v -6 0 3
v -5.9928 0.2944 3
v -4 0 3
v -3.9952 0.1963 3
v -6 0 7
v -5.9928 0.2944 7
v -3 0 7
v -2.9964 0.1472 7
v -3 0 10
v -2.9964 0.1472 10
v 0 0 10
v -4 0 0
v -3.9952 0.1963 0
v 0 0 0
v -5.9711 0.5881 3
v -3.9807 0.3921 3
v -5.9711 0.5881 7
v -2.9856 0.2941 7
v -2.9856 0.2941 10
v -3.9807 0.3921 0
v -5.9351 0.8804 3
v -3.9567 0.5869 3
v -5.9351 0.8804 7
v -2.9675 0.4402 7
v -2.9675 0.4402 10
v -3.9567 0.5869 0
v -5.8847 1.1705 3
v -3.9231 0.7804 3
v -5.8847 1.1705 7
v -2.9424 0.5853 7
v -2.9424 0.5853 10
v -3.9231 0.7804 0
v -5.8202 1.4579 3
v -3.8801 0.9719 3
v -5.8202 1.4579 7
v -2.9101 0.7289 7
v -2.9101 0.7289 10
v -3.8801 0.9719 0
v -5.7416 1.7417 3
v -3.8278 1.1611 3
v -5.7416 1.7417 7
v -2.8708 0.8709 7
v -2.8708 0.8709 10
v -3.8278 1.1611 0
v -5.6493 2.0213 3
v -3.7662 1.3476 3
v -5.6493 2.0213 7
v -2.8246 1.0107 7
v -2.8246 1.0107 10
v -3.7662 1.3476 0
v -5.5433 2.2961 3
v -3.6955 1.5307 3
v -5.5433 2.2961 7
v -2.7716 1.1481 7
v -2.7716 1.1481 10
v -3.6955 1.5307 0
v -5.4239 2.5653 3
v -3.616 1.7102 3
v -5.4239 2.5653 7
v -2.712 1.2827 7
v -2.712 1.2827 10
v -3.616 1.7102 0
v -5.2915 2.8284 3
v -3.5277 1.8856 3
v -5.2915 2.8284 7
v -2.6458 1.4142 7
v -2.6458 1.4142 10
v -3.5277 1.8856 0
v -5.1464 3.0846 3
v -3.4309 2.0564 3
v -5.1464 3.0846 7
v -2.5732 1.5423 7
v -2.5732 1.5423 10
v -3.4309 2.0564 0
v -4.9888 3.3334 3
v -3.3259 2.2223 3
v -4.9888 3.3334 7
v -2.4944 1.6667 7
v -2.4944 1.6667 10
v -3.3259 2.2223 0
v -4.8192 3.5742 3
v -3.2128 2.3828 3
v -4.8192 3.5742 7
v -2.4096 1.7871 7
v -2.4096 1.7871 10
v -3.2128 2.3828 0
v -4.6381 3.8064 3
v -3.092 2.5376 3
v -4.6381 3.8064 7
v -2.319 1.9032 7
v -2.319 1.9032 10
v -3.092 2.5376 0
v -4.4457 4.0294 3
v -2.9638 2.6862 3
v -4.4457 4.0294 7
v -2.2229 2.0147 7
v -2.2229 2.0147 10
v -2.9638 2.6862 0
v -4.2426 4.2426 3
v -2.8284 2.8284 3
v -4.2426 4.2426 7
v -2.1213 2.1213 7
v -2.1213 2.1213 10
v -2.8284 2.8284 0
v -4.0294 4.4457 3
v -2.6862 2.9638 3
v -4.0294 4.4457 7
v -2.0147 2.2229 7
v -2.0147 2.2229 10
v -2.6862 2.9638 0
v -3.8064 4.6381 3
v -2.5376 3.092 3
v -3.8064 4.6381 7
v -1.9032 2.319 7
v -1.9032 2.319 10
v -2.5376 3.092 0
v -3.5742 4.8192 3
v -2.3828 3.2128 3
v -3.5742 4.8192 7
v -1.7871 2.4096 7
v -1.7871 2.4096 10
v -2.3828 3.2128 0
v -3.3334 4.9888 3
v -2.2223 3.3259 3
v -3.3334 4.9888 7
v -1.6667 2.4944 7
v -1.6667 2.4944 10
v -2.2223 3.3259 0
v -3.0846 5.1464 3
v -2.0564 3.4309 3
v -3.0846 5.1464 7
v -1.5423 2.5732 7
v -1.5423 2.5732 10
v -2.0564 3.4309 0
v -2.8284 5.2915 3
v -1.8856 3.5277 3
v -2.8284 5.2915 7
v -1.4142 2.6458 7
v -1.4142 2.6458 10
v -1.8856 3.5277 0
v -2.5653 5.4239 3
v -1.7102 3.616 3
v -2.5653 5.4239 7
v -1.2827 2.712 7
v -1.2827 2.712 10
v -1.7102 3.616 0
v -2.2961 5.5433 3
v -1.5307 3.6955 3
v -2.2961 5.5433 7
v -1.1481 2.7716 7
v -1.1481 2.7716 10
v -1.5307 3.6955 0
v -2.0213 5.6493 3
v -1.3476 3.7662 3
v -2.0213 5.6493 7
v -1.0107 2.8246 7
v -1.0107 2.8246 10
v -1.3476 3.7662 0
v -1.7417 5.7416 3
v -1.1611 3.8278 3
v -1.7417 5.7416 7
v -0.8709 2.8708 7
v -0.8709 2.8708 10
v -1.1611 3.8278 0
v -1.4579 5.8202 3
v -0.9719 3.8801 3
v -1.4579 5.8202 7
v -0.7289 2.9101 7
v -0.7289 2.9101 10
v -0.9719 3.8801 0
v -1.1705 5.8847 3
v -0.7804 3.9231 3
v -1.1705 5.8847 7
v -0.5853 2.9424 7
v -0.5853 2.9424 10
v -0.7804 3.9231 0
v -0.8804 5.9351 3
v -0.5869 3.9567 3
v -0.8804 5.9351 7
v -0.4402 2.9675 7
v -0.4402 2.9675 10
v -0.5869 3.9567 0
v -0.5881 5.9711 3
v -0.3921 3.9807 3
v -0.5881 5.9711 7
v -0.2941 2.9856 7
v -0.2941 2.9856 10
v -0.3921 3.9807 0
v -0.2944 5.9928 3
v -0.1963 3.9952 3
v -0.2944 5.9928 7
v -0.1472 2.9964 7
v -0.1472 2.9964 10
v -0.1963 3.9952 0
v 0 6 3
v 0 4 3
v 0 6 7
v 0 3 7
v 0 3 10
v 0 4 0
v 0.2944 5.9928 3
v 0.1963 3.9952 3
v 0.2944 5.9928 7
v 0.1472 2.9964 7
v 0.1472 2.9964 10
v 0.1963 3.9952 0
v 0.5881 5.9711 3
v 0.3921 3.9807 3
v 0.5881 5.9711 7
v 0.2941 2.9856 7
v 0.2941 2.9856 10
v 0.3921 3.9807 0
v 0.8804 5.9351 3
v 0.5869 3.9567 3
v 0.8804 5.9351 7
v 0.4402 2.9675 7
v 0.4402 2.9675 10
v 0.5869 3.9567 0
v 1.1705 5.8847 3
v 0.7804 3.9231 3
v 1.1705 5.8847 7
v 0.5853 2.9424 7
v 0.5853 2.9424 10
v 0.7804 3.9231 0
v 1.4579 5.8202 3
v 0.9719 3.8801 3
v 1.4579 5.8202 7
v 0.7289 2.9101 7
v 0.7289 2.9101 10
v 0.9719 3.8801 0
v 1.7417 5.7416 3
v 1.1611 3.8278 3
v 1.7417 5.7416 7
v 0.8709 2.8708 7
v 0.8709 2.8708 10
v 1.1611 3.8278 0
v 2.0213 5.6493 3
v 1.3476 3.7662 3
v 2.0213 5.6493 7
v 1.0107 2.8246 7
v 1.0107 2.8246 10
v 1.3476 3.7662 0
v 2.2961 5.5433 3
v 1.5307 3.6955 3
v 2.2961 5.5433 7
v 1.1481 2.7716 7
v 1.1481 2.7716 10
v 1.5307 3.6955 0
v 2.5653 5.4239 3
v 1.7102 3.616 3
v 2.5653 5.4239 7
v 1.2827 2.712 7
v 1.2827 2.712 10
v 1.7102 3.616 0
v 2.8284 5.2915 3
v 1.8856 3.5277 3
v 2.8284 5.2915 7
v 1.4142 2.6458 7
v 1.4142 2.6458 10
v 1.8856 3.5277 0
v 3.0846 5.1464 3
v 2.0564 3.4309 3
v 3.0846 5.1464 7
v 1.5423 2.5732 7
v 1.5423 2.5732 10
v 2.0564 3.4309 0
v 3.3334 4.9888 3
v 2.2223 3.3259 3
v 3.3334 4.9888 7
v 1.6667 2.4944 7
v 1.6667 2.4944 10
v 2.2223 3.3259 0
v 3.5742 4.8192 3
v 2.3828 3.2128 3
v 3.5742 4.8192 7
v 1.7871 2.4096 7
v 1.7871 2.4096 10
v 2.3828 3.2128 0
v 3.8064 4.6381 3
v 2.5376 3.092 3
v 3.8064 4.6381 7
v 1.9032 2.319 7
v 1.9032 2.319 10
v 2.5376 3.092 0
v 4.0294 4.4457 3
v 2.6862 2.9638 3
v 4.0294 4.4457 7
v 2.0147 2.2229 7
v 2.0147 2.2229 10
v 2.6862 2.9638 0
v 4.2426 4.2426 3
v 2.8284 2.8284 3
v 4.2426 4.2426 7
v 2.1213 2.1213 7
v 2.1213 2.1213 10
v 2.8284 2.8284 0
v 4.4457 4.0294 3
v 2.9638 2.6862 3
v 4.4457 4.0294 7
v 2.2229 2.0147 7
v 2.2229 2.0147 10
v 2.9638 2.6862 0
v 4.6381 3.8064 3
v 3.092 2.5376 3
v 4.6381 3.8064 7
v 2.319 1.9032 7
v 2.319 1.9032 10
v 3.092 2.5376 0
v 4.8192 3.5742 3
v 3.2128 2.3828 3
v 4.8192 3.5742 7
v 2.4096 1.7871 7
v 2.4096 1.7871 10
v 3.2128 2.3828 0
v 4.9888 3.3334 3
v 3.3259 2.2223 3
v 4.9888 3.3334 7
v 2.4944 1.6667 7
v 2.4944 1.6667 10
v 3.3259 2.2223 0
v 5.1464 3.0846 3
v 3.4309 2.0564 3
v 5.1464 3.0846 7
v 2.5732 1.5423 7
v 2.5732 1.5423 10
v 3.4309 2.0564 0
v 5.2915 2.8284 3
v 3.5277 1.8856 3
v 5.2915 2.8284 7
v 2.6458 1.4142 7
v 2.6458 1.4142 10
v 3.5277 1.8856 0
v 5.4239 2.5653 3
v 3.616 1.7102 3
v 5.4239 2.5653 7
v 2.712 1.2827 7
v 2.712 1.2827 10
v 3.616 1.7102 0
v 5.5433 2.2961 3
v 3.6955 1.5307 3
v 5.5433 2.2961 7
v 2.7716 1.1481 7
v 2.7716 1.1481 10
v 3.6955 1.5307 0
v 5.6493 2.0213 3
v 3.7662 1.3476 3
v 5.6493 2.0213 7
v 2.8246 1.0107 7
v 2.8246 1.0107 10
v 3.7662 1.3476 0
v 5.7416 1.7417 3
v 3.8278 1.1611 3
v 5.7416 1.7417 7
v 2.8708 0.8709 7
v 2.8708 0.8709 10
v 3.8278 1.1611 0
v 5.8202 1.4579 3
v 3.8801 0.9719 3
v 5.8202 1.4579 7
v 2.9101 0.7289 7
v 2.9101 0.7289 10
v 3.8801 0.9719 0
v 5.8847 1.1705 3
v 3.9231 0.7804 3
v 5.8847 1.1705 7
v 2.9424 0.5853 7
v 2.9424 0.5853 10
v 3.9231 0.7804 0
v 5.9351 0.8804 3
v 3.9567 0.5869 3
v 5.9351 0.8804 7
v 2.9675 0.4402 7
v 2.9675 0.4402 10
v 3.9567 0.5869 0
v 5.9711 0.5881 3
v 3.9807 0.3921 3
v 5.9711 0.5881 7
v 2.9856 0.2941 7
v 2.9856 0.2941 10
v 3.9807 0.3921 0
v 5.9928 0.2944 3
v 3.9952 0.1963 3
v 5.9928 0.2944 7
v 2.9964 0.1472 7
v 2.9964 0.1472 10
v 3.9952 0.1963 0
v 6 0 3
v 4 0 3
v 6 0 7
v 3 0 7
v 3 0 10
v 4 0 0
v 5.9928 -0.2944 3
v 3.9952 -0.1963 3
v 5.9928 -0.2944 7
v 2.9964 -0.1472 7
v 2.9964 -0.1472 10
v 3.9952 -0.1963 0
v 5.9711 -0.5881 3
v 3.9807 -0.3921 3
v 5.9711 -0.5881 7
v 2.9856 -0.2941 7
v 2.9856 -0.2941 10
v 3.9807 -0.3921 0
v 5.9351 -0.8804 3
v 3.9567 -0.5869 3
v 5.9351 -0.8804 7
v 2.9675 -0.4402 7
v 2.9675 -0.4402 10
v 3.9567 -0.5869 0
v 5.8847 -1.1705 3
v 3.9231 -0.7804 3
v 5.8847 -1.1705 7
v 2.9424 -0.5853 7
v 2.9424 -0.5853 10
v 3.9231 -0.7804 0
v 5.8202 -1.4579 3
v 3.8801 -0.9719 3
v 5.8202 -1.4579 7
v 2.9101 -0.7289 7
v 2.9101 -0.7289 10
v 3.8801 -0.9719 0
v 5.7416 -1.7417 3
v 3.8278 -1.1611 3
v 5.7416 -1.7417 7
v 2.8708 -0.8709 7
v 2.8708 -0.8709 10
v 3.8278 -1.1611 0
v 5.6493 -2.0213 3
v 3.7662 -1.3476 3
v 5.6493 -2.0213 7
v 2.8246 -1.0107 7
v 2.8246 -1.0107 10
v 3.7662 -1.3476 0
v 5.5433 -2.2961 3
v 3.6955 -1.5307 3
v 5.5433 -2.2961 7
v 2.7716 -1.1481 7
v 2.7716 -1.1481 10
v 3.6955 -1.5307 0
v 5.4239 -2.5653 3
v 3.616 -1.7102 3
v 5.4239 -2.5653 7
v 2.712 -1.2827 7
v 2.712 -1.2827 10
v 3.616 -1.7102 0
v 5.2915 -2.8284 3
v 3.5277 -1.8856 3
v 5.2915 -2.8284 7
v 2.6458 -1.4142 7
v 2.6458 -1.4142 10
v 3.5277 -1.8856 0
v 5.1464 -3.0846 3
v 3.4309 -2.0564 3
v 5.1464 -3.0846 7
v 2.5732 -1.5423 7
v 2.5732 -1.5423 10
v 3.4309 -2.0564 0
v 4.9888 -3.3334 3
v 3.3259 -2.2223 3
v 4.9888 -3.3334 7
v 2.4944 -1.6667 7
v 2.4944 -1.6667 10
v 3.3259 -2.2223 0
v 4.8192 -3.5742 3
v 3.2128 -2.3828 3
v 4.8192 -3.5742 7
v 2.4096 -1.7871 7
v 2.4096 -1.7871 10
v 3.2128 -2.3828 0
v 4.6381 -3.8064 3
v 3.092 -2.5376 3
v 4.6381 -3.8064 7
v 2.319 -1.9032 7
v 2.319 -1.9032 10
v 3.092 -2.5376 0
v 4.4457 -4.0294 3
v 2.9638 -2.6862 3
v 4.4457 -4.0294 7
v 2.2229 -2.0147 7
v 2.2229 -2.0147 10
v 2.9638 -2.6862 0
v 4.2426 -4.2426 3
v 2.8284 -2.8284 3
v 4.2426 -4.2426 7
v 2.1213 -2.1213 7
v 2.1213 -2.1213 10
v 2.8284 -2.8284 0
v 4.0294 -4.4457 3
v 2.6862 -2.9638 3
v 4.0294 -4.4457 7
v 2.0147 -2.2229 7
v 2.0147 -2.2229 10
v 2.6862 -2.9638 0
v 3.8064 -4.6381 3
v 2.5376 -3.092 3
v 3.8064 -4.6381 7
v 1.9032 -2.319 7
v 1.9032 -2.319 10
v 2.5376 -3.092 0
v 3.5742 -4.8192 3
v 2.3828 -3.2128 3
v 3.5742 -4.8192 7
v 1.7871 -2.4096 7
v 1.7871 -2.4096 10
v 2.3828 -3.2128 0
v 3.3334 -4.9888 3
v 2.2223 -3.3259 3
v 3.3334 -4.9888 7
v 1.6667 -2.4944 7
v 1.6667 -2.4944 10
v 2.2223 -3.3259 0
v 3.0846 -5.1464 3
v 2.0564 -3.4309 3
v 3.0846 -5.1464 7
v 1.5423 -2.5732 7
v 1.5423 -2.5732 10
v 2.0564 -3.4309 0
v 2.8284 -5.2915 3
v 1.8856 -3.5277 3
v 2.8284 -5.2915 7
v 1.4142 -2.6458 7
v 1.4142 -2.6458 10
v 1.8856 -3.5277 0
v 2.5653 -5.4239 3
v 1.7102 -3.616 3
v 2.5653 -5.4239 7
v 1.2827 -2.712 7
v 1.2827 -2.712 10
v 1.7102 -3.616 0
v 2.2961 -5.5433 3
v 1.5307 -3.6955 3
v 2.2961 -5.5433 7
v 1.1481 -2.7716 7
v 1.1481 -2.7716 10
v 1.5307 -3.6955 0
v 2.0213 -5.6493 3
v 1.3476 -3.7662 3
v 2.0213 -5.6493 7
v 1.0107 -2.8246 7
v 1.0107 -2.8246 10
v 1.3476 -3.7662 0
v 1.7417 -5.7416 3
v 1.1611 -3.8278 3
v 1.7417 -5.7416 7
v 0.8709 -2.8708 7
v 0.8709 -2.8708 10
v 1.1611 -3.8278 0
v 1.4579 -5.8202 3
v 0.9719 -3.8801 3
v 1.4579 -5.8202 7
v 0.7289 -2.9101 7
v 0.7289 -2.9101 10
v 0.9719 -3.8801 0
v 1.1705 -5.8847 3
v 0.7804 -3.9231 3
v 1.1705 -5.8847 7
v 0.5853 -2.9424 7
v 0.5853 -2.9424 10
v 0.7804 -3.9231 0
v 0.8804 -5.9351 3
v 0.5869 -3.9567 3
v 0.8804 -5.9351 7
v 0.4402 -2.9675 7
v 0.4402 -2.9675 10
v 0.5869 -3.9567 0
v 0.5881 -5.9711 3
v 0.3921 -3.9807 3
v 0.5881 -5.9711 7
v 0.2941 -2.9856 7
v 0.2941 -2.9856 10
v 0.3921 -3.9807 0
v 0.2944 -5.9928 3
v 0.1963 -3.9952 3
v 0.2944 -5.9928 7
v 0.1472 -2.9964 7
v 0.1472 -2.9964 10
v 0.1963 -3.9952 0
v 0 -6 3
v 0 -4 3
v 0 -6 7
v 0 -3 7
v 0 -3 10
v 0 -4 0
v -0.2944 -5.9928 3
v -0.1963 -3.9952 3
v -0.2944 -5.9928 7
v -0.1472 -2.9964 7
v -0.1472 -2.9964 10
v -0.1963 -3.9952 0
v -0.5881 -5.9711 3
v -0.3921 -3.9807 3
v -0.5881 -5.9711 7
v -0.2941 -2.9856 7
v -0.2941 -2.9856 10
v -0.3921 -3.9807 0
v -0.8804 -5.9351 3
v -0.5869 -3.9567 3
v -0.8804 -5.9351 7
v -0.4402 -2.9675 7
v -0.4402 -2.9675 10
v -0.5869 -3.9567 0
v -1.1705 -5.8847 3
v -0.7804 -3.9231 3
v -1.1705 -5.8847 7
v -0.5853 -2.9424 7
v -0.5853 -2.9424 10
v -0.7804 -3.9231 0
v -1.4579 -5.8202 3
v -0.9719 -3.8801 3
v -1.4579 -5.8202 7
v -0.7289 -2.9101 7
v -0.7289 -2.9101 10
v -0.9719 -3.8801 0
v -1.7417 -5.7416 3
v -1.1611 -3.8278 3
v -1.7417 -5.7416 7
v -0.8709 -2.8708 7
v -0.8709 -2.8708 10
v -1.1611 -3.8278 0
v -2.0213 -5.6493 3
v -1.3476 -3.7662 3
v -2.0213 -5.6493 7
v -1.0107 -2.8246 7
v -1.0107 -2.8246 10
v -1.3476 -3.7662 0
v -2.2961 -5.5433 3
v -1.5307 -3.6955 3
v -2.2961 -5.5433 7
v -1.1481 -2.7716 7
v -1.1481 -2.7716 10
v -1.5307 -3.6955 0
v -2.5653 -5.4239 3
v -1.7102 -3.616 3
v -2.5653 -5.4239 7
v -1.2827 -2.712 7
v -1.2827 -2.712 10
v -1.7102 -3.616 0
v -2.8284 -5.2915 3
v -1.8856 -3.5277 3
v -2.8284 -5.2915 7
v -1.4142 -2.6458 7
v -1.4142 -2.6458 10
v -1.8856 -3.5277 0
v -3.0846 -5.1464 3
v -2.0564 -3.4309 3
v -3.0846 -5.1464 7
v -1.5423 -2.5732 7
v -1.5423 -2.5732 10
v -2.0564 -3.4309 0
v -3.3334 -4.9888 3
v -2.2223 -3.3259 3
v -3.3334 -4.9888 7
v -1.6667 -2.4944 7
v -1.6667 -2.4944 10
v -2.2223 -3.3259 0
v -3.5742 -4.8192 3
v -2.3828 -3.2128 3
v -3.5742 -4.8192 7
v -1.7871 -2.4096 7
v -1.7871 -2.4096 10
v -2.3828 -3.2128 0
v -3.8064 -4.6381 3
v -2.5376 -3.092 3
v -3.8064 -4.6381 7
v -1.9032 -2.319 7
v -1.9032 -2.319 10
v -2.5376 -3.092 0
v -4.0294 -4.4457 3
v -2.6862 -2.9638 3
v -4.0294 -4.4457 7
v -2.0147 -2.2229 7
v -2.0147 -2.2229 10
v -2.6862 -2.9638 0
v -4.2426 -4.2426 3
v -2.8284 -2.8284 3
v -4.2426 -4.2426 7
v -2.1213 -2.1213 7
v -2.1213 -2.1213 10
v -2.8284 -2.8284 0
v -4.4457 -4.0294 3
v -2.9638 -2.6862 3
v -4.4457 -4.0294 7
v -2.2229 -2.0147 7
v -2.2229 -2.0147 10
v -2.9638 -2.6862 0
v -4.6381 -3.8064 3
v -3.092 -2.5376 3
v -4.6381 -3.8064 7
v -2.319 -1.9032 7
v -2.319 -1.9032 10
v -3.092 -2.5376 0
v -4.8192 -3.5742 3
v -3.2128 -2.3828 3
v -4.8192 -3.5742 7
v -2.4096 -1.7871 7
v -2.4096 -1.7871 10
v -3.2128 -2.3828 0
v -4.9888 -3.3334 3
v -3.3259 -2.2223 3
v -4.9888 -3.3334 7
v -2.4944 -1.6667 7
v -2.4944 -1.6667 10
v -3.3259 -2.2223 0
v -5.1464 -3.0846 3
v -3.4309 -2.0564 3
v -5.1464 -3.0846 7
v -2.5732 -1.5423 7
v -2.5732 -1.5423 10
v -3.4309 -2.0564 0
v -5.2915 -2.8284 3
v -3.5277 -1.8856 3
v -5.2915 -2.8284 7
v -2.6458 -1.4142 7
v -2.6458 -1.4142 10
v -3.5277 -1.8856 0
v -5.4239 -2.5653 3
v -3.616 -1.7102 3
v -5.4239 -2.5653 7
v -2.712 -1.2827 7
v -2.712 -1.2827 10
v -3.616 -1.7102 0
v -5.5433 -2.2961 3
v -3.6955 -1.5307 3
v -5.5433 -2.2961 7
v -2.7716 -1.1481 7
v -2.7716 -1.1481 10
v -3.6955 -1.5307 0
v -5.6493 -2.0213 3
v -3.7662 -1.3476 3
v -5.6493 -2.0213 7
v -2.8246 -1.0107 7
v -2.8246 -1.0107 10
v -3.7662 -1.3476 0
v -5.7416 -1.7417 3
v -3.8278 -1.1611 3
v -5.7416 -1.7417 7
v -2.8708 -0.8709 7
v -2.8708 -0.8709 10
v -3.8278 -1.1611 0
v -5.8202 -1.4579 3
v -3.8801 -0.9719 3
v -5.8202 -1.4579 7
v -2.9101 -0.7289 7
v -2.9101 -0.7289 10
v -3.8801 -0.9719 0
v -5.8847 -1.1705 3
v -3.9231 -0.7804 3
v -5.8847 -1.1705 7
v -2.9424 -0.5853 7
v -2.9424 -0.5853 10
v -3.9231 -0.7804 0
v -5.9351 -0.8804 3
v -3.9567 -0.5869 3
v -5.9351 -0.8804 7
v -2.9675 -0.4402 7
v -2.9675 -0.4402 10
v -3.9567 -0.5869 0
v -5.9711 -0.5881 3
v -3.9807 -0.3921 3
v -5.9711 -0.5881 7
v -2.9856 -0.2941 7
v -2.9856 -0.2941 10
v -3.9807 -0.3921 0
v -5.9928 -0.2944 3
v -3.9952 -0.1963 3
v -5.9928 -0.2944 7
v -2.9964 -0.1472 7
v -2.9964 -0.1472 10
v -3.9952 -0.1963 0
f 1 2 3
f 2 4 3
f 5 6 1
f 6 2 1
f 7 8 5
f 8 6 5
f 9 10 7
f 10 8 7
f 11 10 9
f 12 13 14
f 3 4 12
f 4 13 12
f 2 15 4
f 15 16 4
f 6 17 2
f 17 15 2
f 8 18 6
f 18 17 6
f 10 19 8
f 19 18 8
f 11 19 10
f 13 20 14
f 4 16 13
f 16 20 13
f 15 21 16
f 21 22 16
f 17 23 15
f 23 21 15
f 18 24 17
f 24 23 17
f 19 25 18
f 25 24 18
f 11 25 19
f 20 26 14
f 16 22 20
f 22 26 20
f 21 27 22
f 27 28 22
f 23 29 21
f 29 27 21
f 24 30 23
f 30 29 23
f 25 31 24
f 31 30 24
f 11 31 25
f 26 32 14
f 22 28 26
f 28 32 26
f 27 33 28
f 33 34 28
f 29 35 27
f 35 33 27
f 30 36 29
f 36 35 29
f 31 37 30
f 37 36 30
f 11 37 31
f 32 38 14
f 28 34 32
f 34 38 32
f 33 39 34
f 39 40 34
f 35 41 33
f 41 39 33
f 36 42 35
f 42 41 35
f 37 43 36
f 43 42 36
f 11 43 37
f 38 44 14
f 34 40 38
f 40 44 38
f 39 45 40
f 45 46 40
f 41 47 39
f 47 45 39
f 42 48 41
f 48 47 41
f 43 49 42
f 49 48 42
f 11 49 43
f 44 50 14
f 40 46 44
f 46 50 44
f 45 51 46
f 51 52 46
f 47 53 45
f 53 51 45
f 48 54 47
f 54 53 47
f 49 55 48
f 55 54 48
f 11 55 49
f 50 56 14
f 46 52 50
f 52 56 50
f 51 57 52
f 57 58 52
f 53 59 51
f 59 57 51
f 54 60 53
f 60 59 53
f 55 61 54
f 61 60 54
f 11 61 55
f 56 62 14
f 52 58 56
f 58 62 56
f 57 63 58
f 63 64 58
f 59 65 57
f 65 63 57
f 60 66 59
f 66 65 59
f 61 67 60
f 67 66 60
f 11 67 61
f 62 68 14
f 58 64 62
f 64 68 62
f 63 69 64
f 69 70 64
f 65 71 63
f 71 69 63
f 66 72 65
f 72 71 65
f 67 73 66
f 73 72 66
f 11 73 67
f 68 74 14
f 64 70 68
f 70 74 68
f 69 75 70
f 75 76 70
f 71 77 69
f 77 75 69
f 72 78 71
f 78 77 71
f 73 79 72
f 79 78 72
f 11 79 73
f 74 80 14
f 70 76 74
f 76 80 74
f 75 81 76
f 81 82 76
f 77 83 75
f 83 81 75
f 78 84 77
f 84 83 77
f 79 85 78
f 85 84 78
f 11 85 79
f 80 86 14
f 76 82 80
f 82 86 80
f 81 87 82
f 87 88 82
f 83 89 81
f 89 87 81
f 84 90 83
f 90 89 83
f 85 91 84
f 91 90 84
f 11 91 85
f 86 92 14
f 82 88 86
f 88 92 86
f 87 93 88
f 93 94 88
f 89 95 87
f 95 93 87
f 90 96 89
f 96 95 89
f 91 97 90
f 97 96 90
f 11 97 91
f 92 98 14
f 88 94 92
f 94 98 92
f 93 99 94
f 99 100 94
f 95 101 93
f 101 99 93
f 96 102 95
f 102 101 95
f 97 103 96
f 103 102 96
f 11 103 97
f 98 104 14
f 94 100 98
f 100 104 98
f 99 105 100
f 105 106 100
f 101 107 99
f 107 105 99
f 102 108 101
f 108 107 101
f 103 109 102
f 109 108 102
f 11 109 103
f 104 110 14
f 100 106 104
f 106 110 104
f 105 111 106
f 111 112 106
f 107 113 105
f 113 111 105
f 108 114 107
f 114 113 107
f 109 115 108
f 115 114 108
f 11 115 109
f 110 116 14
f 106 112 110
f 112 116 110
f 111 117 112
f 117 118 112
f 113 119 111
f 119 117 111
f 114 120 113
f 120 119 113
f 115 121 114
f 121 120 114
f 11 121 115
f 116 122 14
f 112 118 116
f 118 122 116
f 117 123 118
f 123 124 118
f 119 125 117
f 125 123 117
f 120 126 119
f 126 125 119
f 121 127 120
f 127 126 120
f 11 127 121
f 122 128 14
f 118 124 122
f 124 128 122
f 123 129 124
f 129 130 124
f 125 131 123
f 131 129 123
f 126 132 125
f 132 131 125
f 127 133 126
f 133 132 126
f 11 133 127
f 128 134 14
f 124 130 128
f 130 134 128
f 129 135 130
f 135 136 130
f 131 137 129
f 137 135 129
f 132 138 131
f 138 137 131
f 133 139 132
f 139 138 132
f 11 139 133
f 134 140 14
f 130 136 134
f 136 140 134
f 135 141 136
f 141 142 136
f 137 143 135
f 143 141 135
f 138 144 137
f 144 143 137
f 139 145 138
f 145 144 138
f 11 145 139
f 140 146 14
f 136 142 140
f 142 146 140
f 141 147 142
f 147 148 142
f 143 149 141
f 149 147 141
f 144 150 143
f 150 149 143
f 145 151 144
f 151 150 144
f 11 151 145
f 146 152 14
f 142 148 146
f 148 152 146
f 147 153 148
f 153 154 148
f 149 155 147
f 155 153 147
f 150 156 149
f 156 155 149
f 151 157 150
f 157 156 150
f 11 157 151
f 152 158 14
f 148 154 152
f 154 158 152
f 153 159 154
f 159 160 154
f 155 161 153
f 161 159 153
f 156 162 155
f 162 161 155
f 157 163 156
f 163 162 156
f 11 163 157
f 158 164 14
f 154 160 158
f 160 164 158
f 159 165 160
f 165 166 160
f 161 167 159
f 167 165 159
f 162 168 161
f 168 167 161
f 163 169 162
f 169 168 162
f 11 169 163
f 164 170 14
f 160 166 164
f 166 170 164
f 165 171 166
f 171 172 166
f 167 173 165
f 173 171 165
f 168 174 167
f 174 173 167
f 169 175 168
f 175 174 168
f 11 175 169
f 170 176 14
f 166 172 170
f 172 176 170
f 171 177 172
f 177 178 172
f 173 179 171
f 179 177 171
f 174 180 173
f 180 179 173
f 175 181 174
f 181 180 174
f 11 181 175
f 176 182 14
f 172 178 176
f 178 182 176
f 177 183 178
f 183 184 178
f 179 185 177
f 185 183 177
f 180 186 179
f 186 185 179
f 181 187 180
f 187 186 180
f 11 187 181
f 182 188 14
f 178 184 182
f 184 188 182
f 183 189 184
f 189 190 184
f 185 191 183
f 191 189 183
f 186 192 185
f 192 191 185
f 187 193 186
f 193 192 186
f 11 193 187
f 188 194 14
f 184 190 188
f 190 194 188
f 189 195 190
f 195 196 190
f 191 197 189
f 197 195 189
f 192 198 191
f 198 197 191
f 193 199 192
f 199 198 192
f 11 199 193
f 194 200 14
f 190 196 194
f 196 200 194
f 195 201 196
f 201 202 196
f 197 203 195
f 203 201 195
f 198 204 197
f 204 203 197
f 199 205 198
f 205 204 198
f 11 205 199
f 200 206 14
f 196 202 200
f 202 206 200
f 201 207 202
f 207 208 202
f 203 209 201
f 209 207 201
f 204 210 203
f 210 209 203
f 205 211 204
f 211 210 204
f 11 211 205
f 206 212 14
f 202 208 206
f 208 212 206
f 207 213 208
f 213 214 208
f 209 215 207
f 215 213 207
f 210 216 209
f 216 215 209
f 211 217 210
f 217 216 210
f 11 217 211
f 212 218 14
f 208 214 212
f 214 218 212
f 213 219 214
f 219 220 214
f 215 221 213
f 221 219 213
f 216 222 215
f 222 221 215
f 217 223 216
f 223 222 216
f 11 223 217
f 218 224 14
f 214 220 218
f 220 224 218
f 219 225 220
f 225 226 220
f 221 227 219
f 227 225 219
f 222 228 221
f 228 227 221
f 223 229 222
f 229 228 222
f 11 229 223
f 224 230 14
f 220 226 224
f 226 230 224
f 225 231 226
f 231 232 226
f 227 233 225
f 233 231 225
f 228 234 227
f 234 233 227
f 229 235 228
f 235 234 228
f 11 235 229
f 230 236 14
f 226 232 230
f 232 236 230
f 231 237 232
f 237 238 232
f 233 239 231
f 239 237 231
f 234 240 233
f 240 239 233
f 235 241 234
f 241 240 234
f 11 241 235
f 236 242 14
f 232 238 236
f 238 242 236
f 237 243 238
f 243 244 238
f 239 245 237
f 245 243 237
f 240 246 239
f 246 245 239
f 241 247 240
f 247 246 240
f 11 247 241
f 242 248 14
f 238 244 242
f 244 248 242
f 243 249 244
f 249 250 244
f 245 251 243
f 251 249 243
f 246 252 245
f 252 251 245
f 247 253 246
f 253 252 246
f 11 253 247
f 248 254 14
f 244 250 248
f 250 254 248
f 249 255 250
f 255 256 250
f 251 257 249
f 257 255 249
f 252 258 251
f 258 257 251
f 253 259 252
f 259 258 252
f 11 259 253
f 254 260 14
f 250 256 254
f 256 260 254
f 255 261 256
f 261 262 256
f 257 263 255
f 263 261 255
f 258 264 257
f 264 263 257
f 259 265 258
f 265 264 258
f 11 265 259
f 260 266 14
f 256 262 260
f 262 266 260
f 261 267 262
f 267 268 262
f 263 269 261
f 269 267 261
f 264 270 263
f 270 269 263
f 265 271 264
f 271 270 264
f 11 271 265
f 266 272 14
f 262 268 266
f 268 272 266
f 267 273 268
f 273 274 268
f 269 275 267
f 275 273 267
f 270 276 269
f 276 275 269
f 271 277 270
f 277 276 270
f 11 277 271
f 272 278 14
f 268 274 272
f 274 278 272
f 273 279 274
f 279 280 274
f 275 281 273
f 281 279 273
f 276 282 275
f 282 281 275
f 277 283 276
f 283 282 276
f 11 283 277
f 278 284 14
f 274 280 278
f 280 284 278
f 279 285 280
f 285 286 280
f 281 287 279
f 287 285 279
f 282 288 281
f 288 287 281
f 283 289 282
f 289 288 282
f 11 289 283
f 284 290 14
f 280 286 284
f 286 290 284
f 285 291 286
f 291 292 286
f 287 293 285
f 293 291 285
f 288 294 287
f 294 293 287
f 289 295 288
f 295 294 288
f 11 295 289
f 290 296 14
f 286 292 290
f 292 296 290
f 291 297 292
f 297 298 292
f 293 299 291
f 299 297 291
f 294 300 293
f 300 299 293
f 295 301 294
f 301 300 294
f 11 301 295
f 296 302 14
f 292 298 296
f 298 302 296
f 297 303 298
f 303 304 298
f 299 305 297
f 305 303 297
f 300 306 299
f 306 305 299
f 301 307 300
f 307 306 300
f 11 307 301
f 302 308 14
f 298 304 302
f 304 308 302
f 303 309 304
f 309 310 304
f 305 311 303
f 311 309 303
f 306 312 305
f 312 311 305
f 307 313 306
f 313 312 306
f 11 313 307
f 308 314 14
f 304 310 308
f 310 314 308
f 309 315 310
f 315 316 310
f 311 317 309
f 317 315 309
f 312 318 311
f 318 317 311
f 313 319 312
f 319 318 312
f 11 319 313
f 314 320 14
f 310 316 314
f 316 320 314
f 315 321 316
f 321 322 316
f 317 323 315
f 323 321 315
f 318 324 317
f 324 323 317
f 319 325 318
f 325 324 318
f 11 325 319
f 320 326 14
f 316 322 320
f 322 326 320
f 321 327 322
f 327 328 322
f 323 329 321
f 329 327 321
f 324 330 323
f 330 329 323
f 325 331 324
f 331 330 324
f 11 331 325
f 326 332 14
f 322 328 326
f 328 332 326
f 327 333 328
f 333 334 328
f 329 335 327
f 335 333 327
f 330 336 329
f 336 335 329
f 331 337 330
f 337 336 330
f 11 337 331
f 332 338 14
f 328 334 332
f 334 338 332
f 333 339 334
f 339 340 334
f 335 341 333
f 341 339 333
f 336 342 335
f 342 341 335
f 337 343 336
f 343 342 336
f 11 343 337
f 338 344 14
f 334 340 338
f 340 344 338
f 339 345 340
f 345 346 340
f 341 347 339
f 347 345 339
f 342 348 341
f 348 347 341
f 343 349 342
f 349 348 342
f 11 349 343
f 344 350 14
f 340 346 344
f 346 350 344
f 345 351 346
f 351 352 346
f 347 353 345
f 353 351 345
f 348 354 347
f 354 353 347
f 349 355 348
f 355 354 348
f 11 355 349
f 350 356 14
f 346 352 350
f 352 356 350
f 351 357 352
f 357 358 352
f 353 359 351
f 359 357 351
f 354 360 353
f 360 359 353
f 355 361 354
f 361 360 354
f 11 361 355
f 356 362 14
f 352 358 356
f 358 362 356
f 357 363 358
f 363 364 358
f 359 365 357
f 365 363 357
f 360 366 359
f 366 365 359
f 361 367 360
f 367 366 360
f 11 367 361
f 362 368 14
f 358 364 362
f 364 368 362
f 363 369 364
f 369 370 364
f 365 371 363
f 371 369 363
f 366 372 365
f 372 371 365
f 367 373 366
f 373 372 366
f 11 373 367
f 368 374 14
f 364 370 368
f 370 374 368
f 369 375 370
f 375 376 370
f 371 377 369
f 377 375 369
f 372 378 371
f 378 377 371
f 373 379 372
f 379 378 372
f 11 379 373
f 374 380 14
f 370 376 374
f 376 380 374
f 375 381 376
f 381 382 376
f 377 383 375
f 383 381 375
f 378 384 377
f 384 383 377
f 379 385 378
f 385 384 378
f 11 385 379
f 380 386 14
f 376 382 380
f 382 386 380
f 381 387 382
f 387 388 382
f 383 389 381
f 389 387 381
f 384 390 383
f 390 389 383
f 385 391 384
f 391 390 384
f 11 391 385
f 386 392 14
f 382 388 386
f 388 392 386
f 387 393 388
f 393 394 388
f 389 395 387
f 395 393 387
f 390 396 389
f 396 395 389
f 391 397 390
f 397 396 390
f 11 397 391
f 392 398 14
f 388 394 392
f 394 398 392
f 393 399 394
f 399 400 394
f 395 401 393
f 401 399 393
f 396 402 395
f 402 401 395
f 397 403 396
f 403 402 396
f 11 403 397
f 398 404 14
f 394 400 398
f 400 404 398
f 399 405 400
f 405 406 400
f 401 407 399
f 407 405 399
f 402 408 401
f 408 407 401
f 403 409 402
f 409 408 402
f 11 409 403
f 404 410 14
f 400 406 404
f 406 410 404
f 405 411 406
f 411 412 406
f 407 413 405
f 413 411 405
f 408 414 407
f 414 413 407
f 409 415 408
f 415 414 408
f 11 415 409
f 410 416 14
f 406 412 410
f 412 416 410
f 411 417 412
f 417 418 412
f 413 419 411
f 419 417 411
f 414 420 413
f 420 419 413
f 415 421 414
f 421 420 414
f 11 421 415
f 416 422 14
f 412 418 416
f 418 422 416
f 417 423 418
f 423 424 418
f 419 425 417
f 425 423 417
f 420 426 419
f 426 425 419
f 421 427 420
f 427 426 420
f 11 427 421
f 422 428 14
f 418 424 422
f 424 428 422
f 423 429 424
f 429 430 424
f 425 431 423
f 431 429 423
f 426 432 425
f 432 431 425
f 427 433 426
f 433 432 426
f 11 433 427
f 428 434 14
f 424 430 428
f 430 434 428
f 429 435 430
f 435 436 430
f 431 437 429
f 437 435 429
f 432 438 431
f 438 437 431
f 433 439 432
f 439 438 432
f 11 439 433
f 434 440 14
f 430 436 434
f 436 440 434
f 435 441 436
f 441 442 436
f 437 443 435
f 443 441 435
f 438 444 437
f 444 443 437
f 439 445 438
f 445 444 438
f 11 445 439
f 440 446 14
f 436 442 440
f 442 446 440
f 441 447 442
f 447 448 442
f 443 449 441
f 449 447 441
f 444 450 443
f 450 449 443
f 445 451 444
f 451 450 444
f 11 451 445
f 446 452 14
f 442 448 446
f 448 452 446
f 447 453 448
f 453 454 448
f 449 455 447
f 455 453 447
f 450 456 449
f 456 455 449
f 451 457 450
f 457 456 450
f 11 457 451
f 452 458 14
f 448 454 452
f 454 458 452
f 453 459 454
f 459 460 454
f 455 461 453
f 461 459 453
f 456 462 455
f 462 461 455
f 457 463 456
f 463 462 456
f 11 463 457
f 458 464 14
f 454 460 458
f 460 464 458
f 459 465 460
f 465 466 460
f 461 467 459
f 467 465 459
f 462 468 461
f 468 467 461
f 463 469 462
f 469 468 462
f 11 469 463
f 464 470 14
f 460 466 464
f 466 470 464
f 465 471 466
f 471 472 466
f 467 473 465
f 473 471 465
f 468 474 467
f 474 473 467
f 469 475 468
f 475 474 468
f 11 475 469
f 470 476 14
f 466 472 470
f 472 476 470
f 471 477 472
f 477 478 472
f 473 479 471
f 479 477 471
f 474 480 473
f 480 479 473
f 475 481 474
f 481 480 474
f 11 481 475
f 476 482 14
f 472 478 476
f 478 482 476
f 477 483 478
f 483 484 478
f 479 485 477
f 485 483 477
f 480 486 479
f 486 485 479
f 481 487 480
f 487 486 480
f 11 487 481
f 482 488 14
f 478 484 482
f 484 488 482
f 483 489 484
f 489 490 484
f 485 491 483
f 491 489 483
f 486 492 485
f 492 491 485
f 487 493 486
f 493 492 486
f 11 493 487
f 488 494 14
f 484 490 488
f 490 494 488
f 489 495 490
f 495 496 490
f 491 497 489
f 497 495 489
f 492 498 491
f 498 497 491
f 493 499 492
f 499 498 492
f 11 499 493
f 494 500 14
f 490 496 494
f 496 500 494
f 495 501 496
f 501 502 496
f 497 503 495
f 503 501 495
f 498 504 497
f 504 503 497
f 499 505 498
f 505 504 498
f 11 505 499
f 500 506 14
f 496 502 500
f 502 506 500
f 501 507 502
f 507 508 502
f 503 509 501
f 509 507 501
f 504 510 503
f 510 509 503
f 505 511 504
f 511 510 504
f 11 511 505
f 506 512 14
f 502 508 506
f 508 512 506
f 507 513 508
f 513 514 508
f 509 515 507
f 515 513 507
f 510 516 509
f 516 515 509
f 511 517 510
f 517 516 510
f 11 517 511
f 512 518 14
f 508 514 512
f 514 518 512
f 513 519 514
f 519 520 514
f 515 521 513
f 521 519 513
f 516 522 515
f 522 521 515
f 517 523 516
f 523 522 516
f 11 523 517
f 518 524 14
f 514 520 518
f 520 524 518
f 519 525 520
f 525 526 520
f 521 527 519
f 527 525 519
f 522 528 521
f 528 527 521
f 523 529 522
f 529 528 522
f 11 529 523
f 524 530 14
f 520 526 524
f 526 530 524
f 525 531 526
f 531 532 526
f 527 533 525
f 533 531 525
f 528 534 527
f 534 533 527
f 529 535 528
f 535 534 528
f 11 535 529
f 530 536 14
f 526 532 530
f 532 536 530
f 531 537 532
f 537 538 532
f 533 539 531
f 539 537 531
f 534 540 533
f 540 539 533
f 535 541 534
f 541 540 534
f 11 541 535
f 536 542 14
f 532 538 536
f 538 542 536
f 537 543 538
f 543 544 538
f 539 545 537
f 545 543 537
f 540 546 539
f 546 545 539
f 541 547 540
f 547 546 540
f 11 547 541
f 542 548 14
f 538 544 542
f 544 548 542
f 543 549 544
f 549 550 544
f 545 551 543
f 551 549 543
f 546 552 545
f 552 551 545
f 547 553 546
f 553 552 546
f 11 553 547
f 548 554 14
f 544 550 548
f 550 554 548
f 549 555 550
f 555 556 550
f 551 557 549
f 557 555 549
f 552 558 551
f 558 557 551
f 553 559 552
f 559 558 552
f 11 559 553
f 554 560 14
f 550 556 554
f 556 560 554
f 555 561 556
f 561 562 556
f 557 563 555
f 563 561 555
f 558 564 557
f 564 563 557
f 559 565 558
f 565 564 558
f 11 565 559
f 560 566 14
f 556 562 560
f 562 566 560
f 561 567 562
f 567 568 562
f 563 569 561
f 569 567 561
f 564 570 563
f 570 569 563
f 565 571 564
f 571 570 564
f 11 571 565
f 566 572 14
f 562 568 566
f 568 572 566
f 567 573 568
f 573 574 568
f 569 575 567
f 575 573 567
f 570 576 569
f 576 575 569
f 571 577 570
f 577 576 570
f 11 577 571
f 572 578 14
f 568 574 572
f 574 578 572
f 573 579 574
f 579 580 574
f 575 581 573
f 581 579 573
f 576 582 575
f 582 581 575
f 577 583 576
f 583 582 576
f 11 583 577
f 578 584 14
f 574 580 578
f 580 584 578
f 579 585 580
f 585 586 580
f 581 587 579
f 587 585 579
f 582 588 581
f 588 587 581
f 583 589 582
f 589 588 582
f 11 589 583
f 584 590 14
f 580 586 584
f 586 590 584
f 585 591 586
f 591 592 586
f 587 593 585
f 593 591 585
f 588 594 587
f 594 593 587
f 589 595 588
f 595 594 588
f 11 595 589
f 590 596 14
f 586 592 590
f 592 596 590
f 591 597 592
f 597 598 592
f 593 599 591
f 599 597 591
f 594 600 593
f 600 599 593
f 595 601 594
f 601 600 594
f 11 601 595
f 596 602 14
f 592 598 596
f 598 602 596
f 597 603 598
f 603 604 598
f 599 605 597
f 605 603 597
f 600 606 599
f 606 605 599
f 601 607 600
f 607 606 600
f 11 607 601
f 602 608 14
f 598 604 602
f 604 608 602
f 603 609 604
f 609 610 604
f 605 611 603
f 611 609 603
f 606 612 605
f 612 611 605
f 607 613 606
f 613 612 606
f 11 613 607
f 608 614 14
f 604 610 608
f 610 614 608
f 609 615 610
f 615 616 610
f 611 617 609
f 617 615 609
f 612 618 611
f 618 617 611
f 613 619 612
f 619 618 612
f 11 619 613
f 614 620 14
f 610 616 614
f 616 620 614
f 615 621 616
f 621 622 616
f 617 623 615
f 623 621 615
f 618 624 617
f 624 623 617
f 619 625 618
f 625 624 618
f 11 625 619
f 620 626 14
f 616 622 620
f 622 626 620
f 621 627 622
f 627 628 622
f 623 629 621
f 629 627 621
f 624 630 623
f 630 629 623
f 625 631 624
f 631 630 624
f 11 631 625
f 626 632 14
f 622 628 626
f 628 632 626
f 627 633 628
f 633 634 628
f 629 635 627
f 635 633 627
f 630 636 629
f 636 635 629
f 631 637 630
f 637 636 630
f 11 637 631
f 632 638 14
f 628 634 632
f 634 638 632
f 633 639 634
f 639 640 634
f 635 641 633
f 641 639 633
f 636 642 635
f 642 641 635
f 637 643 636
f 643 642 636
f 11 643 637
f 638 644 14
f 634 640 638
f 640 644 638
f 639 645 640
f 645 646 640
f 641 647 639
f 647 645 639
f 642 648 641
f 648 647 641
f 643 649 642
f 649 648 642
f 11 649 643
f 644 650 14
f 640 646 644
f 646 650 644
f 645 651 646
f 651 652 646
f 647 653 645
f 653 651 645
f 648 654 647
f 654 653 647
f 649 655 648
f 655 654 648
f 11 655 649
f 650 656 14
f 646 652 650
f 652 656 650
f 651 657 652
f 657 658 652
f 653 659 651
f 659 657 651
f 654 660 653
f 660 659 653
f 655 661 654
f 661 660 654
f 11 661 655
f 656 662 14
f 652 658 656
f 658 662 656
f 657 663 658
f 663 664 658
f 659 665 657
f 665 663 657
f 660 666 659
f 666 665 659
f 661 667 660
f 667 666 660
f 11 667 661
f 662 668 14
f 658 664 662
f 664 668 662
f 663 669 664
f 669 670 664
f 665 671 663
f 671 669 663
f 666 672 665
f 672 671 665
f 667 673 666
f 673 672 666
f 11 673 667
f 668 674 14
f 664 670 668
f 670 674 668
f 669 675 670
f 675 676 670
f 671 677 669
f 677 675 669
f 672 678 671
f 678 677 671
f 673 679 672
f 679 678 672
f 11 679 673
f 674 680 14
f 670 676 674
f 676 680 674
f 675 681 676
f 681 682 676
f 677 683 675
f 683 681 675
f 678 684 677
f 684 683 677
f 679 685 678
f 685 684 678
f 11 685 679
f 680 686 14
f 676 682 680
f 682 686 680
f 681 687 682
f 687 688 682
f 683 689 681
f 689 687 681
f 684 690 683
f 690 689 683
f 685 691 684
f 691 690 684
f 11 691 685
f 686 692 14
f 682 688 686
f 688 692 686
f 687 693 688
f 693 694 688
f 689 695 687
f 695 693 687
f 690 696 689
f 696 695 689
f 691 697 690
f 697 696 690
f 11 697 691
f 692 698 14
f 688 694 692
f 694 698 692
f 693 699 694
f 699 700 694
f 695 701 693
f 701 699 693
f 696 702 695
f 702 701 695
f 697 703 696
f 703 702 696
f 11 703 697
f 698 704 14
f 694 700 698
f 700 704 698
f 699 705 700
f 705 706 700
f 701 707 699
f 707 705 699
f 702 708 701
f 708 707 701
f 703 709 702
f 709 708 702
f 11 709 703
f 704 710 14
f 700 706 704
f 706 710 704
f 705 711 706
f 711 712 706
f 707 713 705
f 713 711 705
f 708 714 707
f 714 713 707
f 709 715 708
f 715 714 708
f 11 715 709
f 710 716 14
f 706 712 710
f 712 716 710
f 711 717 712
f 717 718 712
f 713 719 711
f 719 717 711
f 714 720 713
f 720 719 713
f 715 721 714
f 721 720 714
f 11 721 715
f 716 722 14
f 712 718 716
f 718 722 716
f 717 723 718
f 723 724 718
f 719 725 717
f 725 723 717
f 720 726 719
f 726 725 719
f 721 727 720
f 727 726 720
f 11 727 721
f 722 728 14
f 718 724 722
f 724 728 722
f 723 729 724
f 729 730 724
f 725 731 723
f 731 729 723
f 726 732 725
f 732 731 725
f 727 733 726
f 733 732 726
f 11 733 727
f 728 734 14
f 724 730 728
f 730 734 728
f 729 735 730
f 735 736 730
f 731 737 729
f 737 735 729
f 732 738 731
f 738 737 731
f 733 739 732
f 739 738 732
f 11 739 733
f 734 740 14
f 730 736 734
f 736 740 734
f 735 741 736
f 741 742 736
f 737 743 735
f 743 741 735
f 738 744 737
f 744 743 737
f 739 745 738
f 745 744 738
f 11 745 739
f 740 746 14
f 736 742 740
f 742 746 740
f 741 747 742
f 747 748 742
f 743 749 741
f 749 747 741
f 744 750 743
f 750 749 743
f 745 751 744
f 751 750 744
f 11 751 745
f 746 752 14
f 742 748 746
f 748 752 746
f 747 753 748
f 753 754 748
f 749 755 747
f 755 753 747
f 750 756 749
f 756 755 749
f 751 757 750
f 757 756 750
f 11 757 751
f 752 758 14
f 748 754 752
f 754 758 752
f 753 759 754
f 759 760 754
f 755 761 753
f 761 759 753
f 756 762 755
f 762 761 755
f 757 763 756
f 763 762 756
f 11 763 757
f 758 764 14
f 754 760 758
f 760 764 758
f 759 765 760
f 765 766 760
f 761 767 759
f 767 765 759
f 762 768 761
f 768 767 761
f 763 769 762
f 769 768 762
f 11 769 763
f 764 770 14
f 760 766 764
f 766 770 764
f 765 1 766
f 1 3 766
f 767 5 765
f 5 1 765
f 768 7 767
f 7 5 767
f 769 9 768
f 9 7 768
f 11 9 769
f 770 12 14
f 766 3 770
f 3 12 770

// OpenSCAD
// Auto-generated from tests/data/feature_fixtures_manifest.json
// fixture: revolve_stepped_shaft
// fixture_type: revolve
// description: Stepped shaft profile for generic polygon revolve recovery.
$fn = 96;

profile = [
    [0.000000, 0.000000],
    [4.000000, 0.000000],
    [4.000000, 3.000000],
    [6.000000, 3.000000],
    [6.000000, 7.000000],
    [3.000000, 7.000000],
    [3.000000, 10.000000],
    [0.000000, 10.000000]
];

rotate_extrude($fn=128) polygon(points=profile);
